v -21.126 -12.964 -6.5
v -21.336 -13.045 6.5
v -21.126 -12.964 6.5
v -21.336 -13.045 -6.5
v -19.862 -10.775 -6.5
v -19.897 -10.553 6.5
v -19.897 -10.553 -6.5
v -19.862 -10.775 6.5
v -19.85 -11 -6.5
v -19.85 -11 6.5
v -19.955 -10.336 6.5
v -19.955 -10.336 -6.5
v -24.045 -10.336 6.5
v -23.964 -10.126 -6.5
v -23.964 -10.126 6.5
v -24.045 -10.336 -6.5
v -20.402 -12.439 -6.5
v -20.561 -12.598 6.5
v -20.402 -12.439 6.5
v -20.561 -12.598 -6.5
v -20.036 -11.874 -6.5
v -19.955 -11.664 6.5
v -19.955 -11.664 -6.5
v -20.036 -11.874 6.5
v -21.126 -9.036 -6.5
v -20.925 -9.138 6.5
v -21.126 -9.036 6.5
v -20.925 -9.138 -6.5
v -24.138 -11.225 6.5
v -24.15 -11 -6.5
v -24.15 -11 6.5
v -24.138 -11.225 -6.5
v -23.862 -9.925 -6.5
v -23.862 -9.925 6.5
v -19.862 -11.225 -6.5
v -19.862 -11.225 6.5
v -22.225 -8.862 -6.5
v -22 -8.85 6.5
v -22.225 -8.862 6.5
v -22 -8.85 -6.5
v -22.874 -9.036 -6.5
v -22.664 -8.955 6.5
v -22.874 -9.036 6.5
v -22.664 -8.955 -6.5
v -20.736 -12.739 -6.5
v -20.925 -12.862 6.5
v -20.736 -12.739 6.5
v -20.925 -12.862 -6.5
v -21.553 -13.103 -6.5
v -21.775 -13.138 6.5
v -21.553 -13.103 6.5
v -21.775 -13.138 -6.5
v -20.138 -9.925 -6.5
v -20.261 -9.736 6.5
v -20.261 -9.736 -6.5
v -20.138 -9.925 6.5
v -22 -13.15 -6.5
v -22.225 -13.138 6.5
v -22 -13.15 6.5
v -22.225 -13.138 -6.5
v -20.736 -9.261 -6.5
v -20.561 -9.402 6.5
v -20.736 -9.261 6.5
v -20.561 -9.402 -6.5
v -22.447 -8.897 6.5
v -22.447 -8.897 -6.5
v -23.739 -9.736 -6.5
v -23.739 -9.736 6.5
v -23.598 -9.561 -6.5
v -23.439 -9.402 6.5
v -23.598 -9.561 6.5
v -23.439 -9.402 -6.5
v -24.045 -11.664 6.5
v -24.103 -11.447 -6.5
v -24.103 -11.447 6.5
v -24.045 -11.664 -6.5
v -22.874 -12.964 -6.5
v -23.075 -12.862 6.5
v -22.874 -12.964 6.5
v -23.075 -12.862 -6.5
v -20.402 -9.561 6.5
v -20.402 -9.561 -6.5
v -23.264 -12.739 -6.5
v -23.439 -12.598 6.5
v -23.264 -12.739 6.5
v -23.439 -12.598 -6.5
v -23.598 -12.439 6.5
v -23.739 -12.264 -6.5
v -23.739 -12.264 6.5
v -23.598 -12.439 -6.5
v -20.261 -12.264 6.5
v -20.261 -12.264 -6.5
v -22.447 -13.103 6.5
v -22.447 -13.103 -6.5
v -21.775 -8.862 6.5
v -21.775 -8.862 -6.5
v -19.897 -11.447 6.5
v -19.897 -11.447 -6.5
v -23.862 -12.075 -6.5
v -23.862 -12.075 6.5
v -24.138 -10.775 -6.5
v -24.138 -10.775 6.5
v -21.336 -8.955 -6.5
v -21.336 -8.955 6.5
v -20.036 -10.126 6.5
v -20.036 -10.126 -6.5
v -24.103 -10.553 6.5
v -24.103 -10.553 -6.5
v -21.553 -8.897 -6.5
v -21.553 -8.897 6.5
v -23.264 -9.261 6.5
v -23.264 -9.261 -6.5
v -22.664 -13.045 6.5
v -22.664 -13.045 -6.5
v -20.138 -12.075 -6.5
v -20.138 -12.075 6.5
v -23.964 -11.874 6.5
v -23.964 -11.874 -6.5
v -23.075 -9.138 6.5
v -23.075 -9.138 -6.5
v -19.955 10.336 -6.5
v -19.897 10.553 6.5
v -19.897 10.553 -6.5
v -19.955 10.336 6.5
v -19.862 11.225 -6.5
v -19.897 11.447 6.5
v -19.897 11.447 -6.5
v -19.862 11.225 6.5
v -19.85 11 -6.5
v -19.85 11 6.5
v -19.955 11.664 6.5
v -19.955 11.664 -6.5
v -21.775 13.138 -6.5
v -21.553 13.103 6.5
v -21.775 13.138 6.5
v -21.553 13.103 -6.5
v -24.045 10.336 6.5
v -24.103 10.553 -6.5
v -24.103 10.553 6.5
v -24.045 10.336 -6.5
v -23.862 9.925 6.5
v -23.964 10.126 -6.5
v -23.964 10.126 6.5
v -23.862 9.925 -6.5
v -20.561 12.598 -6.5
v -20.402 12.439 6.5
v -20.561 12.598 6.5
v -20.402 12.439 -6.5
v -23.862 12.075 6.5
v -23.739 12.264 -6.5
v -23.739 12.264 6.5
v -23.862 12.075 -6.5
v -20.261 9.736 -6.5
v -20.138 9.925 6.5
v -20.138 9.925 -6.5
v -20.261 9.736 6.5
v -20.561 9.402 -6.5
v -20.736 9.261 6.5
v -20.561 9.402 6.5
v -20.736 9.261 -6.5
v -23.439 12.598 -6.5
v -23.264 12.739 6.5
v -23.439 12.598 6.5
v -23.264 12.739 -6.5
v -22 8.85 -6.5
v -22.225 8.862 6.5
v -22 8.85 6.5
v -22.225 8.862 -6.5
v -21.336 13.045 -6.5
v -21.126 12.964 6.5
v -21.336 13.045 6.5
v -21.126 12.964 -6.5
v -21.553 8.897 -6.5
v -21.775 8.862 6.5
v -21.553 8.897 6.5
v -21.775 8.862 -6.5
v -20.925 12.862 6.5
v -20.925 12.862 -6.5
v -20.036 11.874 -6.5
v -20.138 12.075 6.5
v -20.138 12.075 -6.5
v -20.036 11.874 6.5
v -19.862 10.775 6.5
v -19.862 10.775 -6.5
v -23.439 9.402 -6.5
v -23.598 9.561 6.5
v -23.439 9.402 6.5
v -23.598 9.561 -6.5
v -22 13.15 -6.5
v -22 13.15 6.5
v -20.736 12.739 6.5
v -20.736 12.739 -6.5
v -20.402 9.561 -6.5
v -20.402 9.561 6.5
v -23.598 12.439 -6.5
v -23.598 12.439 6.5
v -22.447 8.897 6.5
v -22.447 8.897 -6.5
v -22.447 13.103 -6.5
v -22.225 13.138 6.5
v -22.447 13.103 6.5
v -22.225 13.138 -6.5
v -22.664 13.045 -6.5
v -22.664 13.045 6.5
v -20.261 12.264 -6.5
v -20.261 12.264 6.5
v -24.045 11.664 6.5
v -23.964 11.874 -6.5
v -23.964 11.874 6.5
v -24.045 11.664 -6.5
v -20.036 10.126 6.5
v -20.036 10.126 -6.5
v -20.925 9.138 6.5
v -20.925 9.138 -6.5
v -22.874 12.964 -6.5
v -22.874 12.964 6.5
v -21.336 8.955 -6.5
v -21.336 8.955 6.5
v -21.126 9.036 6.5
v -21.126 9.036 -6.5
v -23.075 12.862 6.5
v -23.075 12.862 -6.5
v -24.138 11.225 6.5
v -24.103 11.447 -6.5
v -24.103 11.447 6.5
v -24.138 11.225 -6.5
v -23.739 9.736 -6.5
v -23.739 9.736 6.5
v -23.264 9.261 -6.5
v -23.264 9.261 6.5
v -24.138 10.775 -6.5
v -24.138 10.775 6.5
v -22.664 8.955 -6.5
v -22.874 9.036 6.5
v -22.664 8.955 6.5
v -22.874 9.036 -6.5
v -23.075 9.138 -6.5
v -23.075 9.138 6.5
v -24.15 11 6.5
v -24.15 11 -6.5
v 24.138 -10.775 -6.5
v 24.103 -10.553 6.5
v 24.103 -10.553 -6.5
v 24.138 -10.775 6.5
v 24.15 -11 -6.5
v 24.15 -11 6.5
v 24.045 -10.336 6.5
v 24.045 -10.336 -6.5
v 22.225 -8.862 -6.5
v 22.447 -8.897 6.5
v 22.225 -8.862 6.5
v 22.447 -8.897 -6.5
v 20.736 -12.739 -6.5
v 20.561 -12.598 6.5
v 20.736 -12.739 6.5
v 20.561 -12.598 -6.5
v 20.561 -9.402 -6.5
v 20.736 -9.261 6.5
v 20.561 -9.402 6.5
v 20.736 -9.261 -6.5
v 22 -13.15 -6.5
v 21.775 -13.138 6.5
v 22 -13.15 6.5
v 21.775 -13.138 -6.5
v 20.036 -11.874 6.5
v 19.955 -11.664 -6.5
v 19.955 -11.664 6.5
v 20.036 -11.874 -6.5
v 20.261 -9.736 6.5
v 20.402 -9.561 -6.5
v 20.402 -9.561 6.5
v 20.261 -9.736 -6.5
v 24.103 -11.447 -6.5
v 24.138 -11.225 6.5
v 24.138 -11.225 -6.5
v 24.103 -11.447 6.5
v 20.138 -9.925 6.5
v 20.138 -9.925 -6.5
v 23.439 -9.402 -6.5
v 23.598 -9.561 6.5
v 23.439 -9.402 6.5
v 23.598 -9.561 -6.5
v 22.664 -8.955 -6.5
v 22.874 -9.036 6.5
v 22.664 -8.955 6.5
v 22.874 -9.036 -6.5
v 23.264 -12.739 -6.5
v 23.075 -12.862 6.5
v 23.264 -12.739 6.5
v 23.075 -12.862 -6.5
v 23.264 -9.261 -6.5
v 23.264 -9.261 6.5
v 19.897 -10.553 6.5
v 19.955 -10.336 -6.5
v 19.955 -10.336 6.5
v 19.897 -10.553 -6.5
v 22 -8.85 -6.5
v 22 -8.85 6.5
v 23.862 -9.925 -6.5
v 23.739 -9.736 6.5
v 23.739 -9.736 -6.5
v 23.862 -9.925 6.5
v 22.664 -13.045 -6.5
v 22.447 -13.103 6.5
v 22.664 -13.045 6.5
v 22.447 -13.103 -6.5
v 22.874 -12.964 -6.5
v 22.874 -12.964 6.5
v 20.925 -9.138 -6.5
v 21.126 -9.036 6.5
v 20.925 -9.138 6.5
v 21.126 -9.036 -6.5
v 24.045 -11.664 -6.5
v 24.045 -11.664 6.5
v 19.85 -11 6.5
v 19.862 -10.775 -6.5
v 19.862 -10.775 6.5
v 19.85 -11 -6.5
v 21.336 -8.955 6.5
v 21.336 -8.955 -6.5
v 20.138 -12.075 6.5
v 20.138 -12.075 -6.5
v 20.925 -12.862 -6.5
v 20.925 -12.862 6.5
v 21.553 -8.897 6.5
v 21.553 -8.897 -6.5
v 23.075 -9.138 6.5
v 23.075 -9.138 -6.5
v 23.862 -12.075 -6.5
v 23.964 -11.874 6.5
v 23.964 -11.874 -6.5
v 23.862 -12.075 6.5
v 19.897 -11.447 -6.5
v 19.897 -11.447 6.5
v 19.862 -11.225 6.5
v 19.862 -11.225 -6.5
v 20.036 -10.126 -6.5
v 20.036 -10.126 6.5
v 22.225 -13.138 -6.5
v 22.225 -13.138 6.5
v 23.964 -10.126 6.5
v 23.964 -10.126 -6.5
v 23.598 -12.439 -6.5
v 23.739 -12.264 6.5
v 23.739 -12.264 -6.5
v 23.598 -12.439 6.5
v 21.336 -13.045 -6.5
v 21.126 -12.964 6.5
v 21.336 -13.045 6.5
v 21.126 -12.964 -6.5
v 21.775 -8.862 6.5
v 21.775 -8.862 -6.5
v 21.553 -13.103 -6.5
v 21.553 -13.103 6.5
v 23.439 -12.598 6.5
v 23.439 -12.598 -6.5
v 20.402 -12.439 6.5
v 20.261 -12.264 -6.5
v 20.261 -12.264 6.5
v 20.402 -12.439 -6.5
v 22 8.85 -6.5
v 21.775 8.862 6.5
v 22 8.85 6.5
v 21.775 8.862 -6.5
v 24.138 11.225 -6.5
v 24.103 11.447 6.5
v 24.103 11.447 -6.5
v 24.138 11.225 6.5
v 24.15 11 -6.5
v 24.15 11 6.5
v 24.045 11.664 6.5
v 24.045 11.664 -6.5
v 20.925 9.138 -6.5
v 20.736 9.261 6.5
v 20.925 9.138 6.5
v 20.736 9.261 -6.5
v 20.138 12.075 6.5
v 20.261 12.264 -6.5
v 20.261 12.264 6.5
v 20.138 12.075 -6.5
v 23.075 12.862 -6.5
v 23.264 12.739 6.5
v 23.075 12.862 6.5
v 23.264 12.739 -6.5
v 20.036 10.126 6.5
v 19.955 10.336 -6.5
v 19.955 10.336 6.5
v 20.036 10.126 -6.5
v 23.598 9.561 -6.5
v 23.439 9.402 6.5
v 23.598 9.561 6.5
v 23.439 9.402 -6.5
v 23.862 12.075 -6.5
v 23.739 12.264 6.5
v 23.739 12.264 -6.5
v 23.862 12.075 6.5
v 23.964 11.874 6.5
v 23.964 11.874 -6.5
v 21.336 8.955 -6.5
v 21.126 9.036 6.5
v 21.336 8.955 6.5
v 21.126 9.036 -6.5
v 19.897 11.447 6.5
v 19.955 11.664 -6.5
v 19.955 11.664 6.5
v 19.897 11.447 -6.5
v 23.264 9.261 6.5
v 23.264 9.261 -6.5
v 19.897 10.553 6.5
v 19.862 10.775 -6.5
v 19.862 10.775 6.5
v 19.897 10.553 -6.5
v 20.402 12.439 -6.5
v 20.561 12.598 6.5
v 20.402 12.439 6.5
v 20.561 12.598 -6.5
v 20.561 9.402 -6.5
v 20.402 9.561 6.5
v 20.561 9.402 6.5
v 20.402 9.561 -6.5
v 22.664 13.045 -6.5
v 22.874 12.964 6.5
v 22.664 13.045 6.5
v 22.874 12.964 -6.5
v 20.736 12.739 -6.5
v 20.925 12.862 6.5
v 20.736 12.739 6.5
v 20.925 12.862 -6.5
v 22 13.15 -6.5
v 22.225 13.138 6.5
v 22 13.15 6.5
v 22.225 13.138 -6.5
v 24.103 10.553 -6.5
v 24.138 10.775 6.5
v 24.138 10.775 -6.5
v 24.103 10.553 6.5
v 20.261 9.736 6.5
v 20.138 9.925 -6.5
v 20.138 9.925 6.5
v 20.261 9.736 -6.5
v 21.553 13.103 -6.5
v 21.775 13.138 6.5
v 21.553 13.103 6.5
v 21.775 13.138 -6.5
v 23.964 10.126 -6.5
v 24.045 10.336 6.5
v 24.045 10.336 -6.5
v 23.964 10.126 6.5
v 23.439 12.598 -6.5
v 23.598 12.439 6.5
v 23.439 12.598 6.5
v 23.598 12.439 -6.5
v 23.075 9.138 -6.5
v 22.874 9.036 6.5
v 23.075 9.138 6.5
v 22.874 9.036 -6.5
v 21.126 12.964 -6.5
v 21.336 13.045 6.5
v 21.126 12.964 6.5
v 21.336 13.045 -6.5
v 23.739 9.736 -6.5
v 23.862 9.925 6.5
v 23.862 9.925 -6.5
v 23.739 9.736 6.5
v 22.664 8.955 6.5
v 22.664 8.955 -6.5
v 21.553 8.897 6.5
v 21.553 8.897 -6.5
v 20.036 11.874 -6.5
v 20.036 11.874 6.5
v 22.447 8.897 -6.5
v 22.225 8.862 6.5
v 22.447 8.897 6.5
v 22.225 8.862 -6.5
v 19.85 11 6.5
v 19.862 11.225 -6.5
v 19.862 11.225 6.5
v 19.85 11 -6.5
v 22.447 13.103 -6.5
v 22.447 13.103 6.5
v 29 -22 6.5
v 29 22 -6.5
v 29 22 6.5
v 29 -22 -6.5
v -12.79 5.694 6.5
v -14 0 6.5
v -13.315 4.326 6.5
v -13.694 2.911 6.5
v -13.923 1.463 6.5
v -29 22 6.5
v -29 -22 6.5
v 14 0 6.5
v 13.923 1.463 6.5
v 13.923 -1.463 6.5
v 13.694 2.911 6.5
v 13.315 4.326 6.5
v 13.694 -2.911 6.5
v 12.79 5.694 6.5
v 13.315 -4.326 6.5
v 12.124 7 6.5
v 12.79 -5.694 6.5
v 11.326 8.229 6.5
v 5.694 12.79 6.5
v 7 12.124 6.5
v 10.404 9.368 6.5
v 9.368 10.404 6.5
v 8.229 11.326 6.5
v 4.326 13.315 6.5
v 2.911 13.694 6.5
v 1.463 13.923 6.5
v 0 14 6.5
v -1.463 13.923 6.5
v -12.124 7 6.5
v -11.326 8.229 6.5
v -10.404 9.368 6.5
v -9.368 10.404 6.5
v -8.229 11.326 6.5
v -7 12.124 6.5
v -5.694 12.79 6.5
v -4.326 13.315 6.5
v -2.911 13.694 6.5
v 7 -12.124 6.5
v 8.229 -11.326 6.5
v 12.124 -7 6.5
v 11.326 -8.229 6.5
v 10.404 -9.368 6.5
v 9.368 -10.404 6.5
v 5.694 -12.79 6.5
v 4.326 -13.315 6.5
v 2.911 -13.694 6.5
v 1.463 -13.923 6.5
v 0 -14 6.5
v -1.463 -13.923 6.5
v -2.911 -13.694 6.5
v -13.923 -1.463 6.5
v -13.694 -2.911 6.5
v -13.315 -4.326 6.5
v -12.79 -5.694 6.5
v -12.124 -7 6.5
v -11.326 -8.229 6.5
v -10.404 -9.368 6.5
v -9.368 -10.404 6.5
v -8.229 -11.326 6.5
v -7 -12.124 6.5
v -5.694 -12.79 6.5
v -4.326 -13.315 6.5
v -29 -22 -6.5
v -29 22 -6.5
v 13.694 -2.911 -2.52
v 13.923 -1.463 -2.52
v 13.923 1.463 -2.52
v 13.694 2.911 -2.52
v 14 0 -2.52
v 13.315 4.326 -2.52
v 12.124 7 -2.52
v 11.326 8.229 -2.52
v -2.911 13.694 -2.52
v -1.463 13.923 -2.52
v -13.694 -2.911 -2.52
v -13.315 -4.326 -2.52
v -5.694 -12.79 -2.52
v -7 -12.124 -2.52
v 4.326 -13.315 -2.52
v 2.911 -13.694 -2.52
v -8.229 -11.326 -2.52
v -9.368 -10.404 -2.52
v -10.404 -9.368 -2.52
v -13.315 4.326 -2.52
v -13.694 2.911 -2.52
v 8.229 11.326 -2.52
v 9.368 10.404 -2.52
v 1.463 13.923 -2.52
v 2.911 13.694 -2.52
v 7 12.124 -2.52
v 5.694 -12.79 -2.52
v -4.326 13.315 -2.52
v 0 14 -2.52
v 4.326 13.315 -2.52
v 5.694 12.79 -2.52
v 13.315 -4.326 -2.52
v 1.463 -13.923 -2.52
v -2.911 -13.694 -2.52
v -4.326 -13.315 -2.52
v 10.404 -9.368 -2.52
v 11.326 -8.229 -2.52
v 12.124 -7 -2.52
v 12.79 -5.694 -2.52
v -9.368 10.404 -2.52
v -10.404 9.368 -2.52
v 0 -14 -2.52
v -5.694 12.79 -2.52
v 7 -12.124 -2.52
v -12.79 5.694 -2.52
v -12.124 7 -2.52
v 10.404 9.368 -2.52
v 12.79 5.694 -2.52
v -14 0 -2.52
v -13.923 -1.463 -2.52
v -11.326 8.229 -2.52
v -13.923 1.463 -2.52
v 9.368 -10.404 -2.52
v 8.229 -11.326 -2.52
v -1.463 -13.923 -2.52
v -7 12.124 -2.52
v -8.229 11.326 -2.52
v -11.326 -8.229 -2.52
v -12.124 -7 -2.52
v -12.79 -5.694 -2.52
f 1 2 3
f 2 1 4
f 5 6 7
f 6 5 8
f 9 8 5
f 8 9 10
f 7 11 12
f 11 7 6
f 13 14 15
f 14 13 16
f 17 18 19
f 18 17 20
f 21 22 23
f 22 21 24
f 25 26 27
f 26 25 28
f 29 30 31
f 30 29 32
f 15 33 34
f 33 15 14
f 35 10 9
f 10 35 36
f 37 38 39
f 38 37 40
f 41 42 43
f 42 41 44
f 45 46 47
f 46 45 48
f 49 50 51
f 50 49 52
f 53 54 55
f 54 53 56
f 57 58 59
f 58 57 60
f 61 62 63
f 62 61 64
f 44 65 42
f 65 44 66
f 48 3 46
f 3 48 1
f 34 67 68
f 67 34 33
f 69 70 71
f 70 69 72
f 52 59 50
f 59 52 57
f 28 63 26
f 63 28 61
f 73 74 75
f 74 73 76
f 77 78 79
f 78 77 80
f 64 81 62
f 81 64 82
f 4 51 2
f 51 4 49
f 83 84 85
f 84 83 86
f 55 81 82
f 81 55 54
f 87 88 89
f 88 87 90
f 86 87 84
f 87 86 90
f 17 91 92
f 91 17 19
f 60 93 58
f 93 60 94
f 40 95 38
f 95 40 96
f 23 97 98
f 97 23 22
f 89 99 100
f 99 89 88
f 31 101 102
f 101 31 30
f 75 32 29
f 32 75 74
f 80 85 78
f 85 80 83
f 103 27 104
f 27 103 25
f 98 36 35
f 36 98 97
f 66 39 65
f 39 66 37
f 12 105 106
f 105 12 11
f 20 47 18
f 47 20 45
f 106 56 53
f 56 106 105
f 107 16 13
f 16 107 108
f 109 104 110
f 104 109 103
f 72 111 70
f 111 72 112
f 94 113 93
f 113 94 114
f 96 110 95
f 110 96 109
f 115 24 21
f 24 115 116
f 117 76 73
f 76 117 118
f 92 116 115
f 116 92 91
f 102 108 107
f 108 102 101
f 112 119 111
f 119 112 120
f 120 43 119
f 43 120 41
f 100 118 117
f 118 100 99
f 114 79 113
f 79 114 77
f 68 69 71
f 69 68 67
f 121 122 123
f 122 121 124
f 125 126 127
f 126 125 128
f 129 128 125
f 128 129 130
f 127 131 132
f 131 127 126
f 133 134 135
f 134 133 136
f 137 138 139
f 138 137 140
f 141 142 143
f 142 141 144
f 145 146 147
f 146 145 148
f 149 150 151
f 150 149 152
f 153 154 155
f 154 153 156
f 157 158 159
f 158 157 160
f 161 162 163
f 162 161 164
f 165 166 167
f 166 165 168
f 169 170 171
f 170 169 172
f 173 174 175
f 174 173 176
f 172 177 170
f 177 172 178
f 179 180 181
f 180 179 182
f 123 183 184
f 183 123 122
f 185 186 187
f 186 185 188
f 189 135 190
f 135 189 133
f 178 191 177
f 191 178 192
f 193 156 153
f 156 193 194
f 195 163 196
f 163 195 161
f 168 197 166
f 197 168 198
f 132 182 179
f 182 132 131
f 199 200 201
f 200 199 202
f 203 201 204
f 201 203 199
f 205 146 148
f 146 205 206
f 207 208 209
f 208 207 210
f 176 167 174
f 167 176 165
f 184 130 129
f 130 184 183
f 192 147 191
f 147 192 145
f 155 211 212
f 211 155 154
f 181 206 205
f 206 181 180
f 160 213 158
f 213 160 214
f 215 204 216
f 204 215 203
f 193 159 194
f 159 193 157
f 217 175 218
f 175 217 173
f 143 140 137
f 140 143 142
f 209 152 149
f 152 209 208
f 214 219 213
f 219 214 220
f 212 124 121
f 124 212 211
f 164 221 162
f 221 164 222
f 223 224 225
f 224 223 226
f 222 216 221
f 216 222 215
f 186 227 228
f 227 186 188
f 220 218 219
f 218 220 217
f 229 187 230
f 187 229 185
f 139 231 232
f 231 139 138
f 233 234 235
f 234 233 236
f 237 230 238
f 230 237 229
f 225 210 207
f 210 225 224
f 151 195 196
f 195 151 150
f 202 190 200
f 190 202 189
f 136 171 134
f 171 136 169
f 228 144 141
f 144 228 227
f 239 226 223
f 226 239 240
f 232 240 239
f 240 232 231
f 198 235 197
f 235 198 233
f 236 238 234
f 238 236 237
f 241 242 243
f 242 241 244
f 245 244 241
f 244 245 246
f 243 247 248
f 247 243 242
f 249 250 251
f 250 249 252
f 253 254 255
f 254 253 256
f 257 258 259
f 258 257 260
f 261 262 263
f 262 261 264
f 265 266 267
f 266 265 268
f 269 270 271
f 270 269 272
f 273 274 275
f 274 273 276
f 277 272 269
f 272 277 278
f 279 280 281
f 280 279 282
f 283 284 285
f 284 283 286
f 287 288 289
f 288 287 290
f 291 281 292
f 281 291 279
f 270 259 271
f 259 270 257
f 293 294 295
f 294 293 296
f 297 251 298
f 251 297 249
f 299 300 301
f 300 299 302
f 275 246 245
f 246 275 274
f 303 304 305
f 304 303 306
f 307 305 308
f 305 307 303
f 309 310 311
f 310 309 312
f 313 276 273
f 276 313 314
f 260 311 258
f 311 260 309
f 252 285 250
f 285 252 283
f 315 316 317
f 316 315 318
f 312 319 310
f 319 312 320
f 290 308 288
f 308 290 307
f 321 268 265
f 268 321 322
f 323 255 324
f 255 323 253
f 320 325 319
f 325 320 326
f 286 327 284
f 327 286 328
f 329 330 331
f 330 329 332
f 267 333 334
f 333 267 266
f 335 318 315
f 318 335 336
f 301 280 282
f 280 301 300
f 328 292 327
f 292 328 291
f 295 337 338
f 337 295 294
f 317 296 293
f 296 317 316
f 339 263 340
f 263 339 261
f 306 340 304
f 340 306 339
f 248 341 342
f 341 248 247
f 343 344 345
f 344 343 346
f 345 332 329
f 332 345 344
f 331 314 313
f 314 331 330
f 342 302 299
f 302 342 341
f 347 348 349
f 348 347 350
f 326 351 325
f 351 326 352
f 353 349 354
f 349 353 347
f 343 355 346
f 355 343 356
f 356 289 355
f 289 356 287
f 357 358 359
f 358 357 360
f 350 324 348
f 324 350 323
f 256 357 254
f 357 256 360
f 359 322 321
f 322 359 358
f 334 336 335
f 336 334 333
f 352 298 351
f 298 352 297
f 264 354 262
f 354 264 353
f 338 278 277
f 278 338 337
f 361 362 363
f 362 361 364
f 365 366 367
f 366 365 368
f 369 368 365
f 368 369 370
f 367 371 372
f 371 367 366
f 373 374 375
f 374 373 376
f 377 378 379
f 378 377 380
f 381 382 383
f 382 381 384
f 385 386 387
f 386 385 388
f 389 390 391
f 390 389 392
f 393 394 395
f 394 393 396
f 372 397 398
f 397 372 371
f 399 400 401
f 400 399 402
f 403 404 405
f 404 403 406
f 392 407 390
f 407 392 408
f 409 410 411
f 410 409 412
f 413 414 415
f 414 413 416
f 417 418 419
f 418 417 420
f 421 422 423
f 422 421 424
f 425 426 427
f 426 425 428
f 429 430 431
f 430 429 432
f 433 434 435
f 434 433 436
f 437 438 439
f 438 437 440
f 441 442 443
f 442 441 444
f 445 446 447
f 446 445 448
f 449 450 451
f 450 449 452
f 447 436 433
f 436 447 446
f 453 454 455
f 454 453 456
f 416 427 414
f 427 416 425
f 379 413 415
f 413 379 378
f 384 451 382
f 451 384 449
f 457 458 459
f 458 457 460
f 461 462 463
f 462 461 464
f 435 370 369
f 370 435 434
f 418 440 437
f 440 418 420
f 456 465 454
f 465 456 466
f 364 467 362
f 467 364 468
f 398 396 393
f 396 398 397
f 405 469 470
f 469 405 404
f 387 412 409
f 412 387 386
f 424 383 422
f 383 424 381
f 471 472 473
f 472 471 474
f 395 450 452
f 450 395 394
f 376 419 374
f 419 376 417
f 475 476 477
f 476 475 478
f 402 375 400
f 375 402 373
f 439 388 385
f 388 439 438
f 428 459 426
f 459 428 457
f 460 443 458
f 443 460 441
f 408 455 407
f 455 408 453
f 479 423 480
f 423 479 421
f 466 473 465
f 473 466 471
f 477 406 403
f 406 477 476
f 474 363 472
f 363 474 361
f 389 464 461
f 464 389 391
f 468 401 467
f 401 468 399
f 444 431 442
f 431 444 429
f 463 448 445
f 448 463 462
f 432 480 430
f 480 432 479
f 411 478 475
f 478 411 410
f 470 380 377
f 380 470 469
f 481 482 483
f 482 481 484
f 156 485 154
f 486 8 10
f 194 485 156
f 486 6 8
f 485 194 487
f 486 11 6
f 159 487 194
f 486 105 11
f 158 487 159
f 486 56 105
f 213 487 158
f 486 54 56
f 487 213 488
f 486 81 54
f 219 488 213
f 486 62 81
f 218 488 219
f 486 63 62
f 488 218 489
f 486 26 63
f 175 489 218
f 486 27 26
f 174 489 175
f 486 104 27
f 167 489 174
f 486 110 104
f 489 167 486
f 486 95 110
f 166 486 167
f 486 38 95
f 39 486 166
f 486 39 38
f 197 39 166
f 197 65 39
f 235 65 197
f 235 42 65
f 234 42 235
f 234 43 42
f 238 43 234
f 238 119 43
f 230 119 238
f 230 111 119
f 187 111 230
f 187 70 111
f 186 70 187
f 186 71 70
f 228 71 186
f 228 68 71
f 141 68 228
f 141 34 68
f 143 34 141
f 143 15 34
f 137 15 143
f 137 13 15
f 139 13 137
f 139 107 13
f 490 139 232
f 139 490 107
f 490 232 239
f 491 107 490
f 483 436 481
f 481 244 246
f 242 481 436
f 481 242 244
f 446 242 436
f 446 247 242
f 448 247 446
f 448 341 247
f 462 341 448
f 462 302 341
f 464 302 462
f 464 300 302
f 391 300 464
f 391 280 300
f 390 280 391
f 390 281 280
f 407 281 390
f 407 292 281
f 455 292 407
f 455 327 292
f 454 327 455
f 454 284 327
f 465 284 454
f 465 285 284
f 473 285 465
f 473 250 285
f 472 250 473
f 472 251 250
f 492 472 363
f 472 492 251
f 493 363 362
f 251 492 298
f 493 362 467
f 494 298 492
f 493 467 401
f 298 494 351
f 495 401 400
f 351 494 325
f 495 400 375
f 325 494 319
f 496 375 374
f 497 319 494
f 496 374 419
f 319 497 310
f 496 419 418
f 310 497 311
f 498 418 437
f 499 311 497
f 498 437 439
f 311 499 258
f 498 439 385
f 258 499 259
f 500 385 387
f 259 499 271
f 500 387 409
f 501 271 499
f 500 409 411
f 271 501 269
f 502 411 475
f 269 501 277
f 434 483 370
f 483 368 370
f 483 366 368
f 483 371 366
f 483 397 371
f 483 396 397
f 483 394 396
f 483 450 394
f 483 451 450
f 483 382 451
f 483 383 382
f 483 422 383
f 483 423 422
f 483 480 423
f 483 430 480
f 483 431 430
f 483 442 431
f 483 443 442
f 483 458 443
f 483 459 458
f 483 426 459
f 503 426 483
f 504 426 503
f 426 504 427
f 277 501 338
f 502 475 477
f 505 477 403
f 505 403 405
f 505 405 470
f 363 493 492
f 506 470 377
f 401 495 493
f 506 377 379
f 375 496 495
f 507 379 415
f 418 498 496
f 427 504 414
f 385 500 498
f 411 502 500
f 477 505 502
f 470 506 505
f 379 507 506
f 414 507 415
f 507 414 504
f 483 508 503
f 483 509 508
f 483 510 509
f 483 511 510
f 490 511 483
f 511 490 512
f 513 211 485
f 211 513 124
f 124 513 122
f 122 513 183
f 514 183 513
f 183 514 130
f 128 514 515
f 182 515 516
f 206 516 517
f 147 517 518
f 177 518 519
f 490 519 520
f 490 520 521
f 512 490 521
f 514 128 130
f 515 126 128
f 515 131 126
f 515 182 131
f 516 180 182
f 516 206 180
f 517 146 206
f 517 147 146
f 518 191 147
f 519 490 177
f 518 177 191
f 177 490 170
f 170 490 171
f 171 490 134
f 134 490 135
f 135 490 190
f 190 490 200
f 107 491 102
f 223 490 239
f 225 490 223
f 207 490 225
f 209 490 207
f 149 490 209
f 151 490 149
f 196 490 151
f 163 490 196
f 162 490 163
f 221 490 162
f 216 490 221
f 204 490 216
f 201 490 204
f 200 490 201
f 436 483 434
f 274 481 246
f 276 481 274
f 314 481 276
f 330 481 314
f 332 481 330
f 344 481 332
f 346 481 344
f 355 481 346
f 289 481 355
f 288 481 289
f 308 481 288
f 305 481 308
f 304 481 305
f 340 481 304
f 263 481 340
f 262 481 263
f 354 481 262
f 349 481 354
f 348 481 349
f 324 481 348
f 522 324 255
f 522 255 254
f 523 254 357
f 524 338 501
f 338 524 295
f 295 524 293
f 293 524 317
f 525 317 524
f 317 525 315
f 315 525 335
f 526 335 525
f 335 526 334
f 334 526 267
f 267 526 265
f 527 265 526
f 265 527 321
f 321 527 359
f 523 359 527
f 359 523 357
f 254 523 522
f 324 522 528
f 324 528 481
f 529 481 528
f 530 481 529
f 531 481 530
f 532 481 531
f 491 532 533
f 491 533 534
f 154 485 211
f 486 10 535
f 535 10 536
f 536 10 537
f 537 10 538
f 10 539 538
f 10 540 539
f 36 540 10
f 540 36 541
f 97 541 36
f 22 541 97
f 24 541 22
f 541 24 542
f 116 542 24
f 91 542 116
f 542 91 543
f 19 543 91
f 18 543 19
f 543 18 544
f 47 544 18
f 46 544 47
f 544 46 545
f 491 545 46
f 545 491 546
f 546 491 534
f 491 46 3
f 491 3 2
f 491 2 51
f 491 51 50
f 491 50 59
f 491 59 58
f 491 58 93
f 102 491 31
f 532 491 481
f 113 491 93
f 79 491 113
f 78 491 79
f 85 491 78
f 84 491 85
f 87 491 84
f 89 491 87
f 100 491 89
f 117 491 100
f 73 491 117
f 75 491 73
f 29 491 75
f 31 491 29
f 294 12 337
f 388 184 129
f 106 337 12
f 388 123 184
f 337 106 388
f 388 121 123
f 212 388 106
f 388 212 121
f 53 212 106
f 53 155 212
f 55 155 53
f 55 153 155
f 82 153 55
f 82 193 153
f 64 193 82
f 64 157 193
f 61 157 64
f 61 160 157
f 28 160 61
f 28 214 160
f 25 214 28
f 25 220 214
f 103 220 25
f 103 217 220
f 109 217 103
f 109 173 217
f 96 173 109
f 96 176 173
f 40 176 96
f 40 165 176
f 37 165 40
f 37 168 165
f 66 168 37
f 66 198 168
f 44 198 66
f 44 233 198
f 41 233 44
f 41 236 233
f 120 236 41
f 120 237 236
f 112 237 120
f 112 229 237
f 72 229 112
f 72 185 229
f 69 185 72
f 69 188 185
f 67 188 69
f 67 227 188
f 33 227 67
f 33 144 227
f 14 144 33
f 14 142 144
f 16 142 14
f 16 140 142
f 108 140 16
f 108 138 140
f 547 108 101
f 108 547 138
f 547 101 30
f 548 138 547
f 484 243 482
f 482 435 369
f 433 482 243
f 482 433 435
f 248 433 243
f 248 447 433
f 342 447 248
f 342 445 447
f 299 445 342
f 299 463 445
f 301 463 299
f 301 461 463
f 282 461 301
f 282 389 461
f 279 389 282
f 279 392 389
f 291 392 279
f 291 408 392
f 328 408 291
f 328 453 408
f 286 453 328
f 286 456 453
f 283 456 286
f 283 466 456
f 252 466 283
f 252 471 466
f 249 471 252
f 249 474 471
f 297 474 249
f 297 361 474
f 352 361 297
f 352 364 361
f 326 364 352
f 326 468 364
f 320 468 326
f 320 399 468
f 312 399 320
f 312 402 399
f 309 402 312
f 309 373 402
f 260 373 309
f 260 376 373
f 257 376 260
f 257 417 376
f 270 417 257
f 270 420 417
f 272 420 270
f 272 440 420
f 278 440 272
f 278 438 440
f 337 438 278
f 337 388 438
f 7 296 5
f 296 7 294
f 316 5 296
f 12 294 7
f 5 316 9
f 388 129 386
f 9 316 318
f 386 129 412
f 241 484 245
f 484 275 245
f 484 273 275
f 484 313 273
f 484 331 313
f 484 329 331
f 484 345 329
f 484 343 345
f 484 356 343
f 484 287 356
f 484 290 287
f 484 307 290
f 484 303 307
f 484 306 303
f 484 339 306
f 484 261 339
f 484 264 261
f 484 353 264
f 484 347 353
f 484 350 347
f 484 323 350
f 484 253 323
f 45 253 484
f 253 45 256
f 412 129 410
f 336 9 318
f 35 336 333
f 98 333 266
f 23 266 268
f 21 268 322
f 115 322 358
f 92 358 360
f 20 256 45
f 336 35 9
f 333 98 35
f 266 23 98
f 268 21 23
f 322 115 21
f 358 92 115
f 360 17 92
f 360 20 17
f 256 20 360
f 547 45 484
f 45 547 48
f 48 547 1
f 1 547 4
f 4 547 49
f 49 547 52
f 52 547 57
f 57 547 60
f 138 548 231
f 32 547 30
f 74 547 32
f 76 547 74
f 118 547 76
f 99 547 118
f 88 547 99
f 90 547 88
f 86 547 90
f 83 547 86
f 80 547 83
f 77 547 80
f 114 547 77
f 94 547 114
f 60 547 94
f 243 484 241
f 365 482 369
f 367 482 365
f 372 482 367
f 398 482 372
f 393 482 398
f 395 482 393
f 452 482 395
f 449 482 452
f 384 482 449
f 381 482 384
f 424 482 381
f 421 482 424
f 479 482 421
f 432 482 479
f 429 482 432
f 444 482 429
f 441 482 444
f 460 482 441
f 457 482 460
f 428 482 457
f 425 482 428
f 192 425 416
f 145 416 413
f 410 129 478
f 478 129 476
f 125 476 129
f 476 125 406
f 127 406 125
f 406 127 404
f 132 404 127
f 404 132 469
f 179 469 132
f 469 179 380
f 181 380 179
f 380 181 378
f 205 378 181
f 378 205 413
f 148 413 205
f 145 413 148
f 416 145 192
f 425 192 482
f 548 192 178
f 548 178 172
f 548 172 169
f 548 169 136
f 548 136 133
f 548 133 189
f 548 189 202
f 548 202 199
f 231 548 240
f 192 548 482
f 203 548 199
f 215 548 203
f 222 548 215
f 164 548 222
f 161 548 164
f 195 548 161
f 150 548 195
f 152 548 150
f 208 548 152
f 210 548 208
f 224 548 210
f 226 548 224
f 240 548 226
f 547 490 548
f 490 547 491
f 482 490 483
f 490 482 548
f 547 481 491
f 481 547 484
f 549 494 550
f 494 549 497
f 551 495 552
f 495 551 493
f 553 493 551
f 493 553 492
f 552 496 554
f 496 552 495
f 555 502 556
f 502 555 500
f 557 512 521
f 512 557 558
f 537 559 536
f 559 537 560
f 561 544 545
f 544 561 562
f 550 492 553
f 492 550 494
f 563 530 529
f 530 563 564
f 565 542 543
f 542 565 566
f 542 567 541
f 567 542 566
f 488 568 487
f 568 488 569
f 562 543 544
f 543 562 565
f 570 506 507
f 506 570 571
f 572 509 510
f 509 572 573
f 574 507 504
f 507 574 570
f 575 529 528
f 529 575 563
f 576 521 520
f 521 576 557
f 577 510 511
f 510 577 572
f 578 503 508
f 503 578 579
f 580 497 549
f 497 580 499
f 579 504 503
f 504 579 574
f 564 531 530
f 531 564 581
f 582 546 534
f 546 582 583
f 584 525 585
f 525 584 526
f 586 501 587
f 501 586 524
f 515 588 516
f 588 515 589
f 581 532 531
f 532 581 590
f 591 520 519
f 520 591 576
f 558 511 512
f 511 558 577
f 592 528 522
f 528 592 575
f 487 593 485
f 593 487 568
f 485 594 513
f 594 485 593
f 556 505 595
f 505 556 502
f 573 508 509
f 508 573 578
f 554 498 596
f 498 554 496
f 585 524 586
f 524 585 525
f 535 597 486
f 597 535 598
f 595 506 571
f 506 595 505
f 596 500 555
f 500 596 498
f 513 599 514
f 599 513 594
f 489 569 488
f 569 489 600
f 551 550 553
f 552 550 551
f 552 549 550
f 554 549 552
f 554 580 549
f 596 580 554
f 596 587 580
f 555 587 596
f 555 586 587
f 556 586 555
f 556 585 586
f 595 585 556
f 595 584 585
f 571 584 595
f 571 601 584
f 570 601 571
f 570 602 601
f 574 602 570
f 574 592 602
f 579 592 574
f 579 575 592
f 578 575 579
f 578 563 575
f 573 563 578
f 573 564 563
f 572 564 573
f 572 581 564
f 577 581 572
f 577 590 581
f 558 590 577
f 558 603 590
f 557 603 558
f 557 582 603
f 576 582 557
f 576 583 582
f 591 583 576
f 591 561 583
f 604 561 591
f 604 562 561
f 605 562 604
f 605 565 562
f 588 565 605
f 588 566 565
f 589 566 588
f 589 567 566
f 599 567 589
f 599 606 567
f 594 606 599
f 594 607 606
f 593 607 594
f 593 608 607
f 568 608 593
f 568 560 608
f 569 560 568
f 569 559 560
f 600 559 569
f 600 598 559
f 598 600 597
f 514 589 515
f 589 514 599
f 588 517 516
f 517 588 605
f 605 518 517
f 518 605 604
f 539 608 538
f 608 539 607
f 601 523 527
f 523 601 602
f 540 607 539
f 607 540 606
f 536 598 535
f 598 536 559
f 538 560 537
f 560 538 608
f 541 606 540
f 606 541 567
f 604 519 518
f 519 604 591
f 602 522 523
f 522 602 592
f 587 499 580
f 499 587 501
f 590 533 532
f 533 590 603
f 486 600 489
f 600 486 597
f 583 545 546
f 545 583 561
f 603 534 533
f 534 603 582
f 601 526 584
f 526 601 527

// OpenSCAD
// Lead-screw nut holder with 28 mm pocket.
$fn = 60;
eps = 0.02;
body_l = 58;
body_w = 44;
body_t = 13;
pocket_d = 28;
pocket_depth = 9;
mount_x = 22.0;
difference() {
    cube([body_l, body_w, body_t], center = true);
    translate([0, 0, body_t / 2 - pocket_depth - eps]) cylinder(d = pocket_d, h = pocket_depth + 2 * eps);
    for (x = [-mount_x, mount_x], y = [-body_w / 4, body_w / 4])
        translate([x, y, -body_t / 2 - eps]) cylinder(d = 4.3, h = body_t + 2 * eps);
}
